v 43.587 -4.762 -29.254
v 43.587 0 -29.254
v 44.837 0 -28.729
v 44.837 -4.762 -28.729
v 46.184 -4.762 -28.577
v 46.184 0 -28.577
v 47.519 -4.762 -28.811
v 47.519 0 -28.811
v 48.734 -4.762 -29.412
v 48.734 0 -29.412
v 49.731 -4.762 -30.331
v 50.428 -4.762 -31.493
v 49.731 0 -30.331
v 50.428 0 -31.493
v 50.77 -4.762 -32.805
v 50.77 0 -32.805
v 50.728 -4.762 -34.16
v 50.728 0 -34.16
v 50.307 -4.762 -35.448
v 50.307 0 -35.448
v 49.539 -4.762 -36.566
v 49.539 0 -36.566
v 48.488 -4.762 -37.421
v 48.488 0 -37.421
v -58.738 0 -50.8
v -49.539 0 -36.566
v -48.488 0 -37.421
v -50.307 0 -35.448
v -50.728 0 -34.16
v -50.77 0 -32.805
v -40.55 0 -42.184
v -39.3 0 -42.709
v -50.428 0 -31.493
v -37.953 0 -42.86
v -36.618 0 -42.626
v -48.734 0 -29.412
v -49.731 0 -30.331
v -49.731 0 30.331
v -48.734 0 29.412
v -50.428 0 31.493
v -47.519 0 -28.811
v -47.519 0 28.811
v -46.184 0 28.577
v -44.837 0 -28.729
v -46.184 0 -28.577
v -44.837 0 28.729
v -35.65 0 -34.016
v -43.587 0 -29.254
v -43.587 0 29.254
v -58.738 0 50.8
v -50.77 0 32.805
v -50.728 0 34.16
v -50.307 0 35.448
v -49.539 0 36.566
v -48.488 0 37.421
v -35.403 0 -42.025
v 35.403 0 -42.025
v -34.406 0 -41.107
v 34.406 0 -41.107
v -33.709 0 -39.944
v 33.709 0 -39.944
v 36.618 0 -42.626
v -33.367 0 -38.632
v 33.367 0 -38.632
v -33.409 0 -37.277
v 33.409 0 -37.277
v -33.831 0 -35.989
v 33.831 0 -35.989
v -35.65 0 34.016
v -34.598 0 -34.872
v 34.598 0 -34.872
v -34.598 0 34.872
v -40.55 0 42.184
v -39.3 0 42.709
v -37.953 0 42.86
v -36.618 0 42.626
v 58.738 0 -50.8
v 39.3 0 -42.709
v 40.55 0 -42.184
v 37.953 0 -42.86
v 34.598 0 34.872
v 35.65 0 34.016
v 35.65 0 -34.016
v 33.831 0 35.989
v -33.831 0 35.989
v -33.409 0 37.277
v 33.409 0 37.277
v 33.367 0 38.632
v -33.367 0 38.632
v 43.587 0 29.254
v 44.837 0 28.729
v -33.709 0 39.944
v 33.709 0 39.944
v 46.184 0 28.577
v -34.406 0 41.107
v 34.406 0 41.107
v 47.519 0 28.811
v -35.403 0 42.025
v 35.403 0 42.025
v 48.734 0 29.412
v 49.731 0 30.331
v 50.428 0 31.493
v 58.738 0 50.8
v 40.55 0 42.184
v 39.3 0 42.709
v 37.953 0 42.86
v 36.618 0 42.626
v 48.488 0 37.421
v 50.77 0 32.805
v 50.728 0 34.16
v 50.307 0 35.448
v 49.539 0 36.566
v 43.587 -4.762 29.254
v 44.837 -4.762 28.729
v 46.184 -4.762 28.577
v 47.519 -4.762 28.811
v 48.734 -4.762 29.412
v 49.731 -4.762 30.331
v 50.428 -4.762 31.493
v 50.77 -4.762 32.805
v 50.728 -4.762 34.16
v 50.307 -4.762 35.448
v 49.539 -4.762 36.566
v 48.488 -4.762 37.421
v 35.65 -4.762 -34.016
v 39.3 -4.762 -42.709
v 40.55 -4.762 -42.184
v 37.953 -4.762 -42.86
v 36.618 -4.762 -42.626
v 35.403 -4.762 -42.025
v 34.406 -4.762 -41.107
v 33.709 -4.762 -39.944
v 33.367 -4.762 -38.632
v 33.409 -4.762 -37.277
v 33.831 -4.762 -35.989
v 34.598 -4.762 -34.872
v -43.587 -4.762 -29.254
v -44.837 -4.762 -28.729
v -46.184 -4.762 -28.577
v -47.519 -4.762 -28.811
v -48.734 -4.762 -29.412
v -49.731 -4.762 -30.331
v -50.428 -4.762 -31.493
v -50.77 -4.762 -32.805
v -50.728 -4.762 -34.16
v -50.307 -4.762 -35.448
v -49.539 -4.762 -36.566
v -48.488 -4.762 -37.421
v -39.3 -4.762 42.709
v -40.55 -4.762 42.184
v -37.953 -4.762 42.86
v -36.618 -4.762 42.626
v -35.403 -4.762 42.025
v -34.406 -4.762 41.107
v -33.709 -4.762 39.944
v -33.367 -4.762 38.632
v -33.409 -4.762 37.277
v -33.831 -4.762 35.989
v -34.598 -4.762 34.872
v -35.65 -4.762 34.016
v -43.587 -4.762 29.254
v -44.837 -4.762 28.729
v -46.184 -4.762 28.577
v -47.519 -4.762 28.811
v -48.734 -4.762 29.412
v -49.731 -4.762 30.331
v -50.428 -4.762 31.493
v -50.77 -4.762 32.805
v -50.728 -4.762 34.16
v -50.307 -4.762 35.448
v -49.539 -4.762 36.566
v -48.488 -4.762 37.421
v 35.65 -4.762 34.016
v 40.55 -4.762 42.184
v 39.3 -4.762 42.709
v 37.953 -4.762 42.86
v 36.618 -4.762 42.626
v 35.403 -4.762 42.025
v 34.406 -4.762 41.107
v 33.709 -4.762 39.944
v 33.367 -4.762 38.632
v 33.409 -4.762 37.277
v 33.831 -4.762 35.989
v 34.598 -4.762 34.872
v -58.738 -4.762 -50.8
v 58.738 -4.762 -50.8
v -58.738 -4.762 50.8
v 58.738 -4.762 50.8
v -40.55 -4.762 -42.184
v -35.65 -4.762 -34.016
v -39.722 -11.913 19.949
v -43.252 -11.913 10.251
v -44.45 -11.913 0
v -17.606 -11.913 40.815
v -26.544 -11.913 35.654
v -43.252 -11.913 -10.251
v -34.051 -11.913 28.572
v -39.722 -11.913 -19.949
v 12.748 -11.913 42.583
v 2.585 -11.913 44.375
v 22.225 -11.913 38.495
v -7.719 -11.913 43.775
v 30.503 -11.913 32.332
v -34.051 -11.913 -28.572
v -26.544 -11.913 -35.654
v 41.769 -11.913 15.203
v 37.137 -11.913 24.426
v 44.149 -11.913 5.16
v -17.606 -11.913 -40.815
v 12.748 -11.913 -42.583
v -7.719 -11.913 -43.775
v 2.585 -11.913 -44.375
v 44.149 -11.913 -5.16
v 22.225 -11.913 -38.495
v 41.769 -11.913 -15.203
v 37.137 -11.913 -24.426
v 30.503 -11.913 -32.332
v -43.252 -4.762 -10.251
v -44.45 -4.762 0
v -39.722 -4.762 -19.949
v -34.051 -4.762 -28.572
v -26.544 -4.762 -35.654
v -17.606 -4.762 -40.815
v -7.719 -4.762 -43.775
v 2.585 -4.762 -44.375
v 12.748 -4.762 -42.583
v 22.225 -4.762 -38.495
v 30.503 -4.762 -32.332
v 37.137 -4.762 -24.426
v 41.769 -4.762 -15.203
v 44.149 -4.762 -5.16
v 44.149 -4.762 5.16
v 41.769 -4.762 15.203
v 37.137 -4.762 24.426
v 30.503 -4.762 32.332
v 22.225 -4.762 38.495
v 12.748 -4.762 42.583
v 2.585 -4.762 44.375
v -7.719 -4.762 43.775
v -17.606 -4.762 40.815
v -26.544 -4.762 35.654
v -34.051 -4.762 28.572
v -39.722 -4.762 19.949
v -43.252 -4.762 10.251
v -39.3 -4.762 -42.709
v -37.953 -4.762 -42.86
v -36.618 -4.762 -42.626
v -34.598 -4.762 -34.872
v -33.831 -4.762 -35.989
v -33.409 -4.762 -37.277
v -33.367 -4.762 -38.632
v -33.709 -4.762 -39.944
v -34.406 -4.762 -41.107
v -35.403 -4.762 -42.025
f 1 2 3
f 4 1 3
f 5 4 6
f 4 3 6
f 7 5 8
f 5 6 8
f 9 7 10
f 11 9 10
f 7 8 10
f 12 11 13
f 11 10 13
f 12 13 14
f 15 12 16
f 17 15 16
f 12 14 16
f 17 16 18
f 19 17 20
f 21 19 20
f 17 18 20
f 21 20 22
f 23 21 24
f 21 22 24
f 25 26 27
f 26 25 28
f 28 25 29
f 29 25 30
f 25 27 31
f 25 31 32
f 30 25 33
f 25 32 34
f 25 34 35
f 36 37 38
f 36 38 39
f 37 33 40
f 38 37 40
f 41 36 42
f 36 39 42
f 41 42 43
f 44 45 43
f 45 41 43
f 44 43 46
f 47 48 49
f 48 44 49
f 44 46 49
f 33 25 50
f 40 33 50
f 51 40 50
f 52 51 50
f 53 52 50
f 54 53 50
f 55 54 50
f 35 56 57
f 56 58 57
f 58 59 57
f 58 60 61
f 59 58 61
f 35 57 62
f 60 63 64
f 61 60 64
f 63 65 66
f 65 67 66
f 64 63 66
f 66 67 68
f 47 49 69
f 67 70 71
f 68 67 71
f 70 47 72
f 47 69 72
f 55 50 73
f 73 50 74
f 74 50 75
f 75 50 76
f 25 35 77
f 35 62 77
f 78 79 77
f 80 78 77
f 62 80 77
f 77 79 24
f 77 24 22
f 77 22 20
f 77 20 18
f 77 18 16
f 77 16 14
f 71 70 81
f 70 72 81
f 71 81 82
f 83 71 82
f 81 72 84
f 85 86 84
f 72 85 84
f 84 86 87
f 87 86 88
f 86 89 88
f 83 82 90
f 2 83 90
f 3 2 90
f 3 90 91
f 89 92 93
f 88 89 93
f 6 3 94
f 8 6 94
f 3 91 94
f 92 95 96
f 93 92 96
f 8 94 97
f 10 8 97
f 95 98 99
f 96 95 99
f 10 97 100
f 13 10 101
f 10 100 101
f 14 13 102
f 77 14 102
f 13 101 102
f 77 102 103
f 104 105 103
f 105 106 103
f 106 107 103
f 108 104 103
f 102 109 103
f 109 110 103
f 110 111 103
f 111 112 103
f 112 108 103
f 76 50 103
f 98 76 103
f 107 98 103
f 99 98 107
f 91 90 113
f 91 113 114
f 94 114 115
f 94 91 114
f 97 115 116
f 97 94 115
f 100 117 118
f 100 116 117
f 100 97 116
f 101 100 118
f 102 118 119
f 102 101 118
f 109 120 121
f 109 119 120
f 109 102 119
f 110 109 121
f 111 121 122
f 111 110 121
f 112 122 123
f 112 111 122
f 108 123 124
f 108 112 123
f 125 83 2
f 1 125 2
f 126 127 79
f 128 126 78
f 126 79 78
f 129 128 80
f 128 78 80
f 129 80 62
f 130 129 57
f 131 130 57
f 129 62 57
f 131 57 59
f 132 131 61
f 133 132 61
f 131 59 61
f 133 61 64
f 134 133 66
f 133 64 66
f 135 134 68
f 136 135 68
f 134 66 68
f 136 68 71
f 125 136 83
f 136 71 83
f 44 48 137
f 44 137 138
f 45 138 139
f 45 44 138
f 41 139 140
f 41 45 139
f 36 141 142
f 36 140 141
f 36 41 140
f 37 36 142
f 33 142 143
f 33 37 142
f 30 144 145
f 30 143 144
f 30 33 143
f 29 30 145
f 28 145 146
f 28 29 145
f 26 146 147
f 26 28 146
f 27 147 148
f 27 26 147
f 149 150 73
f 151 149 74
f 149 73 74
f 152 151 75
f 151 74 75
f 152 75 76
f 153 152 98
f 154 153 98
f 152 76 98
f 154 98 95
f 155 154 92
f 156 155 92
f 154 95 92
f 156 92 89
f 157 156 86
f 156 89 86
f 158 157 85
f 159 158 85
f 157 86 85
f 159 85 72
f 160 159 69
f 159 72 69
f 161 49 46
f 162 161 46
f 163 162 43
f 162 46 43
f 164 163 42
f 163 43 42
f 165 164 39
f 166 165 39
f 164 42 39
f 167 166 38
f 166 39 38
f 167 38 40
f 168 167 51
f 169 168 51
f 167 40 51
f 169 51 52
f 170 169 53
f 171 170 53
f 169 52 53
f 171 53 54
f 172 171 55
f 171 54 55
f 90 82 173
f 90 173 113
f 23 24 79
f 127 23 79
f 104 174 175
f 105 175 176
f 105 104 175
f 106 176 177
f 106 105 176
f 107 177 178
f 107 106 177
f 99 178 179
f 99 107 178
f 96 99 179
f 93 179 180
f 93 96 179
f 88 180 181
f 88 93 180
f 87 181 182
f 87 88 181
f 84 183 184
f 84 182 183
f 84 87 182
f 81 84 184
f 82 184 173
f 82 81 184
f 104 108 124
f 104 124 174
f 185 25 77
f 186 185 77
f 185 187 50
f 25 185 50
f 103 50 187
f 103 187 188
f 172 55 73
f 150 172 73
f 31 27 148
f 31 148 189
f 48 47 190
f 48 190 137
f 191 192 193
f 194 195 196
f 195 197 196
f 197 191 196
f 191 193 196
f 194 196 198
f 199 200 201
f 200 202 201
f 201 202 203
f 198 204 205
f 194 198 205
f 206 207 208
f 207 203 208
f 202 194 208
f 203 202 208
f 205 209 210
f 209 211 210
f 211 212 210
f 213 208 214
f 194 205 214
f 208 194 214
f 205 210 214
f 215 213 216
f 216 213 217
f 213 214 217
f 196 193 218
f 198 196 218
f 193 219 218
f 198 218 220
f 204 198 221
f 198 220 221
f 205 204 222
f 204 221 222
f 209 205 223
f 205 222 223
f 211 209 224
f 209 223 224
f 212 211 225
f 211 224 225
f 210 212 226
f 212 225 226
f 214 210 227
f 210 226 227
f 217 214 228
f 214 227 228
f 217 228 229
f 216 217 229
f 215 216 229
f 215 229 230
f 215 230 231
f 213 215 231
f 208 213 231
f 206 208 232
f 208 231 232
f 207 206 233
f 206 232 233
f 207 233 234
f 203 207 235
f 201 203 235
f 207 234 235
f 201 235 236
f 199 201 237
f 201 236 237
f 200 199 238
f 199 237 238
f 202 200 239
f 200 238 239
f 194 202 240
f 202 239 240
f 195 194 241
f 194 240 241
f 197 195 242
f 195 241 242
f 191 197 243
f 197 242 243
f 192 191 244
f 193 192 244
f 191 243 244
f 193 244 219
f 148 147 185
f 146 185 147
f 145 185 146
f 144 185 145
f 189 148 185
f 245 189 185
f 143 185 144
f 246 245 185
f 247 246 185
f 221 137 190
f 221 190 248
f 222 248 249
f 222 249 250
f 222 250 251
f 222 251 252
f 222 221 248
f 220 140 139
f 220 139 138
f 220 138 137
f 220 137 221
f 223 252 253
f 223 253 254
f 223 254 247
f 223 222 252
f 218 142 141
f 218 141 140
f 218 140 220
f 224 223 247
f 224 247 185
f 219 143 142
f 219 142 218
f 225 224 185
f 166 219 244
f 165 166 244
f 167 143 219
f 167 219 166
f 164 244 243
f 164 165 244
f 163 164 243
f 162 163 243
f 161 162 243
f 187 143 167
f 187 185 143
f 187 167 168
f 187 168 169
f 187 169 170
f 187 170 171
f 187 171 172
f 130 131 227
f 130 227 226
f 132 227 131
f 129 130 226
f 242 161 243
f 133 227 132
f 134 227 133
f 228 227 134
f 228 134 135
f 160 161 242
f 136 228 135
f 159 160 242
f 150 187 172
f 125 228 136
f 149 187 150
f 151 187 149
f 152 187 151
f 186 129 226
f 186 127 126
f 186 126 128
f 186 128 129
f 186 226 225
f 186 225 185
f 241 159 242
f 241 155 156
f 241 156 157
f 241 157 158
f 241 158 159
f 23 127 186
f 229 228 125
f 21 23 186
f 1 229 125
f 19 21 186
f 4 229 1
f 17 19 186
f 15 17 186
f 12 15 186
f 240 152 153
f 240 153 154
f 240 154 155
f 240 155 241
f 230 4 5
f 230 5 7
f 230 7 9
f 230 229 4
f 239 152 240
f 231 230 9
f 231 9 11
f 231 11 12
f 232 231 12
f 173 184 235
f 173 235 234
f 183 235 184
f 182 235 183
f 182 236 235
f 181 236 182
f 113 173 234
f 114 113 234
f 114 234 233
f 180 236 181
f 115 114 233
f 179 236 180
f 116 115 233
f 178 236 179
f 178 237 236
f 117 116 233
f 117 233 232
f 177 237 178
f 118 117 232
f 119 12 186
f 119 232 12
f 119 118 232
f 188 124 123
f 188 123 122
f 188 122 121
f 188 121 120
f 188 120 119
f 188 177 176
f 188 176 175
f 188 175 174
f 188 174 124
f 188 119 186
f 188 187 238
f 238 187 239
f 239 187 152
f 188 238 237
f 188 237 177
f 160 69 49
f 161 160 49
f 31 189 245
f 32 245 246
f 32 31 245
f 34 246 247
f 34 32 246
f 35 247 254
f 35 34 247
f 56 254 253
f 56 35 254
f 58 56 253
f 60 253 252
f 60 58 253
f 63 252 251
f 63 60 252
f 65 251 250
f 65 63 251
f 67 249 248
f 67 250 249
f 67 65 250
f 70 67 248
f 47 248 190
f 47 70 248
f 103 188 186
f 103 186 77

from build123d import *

# Parameters (mm, degrees)
SKETCH1_W               = 117.475
SKETCH1_H               = 4.7625
BOSS_EXTRUDE1_DEPTH     = 50.8
F_1_2_HOLES_DEPTH       = 78.803697293
SKETCH7_W               = 170.933784369
SKETCH7_H               = 70.3072
BOSS_EXTRUDE2_DEPTH     = 164.9349
CUT_EXTRUDE1_DEPTH      = 252.384886958
CUT_EXTRUDE1_DEPTH_BACK = 252.384886958
CUT_EXTRUDE3_DEPTH      = 208.174206511
CUT_EXTRUDE3_DEPTH_BACK = 208.174206511
SKETCH9_OUTSIDE_W       = 162.248
SKETCH9_OUTSIDE_H       = 251.148
BOSS_EXTRUDE3_DEPTH     = 7.9375
SKETCH11_OUTSIDE_W      = 1143.154
SKETCH11_OUTSIDE_H      = 1135.216
SKETCH11_OUTSIDE_R      = 11.1125
CUT_EXTRUDE4_DEPTH      = 255.208337191
CUT_EXTRUDE4_DRAFT      = -60
SKETCH12_R              = 10.795
BOSS_EXTRUDE4_DEPTH     = 64.77
SKETCH13_R              = 298.45
CUT_EXTRUDE5_DEPTH      = 254


with BuildPart() as part:
    # Sketch1 → Boss-Extrude1 (new, symmetric)
    with BuildSketch(Plane.XY):
        with Locations((0, -2.38125)):
            Rectangle(SKETCH1_W, SKETCH1_H)
    extrude(amount=BOSS_EXTRUDE1_DEPTH, both=True)

    # Sketch2 → 1-2 holes (cut, through all)
    with BuildSketch(Plane(origin=(0, 0, 0), x_dir=(1, 0, 0), z_dir=(0, 1, 0))):
        with BuildLine():
            Line((-35.649713965, 34.016189941), (-43.587213965, 29.253689941))
            ThreePointArc((-43.587213965, 29.253689941), (-50.121310059, 30.887213965), (-48.487786035, 37.421310059))
            Line((-48.487786035, 37.421310059), (-40.550286035, 42.183810059))
            ThreePointArc((-40.550286035, 42.183810059), (-34.016189941, 40.550286035), (-35.649713965, 34.016189941))
        make_face()
        with BuildLine():
            Line((-35.649713965, -34.016189941), (-43.587213965, -29.253689941))
            ThreePointArc((-43.587213965, -29.253689941), (-50.121310059, -30.887213965), (-48.487786035, -37.421310059))
            Line((-48.487786035, -37.421310059), (-40.550286035, -42.183810059))
            ThreePointArc((-40.550286035, -42.183810059), (-34.016189941, -40.550286035), (-35.649713965, -34.016189941))
        make_face()
        with BuildLine():
            Line((35.649713965, 34.016189941), (43.587213965, 29.253689941))
            ThreePointArc((43.587213965, 29.253689941), (50.121310059, 30.887213965), (48.487786035, 37.421310059))
            Line((48.487786035, 37.421310059), (40.550286035, 42.183810059))
            ThreePointArc((40.550286035, 42.183810059), (34.016189941, 40.550286035), (35.649713965, 34.016189941))
        make_face()
        with BuildLine():
            Line((35.649713965, -34.016189941), (43.587213965, -29.253689941))
            ThreePointArc((43.587213965, -29.253689941), (50.121310059, -30.887213965), (48.487786035, -37.421310059))
            Line((48.487786035, -37.421310059), (40.550286035, -42.183810059))
            ThreePointArc((40.550286035, -42.183810059), (34.016189941, -40.550286035), (35.649713965, -34.016189941))
        make_face()
    extrude(amount=-F_1_2_HOLES_DEPTH, mode=Mode.SUBTRACT)


with BuildPart() as body_2:
    # Sketch4 → Revolve1 (revolve)
    with BuildSketch(Plane.XY, mode=Mode.PRIVATE) as revolve1_sk:
        Polygon((0, -25.5651), (43.18, -25.5651), (43.18, -14.4526), (40.64, -14.4526), (40.64, -11.9126), (44.45, -11.9126), (44.45, -4.7625), (0, -4.7625), align=None)
    revolve(revolve1_sk.sketch.rotate(Axis((0, -4.7625, 0), (0, -1, 0)), 180), axis=Axis((0, -4.7625, 0), (0, -1, 0)))


with BuildPart() as body_3:
    # Sketch6 → Revolve2 (revolve)
    with BuildSketch(Plane(origin=(-63.5, 0, 0), x_dir=(0, 0, -1), z_dir=(1, 0, 0)), mode=Mode.PRIVATE) as revolve2_sk:
        with BuildLine():
            Line((-25.4, -68.58), (-25.4, -47.336363636))
            ThreePointArc((-25.4, -47.336363636), (-22.694731724, -40.805268276), (-16.163636364, -38.1))
            Line((-16.163636364, -38.1), (-14.143181818, -38.1))
            Line((-14.143181818, -38.1), (-14.143181818, -40.48125))
            Line((-14.143181818, -40.48125), (-10.102272727, -40.48125))
            Line((-10.102272727, -40.48125), (-10.102272727, -38.1))
            Line((-10.102272727, -38.1), (-6.061363636, -38.1))
            Line((-6.061363636, -38.1), (-6.061363636, -40.48125))
            Line((-6.061363636, -40.48125), (-2.020454545, -40.48125))
            Line((-2.020454545, -40.48125), (-2.020454545, -38.1))
            Line((-2.020454545, -38.1), (2.020454545, -38.1))
            Line((2.020454545, -38.1), (2.020454545, -40.48125))
            Line((2.020454545, -40.48125), (6.061363636, -40.48125))
            Line((6.061363636, -40.48125), (6.061363636, -38.1))
            Line((6.061363636, -38.1), (10.102272727, -38.1))
            Line((10.102272727, -38.1), (10.102272727, -40.48125))
            Line((10.102272727, -40.48125), (14.143181818, -40.48125))
            Line((14.143181818, -40.48125), (14.143181818, -38.1))
            Line((14.143181818, -38.1), (16.163636364, -38.1))
            ThreePointArc((16.163636364, -38.1), (22.694731724, -40.805268276), (25.4, -47.336363636))
            Line((25.4, -47.336363636), (25.4, -68.58))
            Line((25.4, -68.58), (26.67, -68.58))
            Line((26.67, -68.58), (26.67, -71.12))
            Line((26.67, -71.12), (23.495, -71.12))
            ThreePointArc((23.495, -71.12), (19.004871939, -72.979871939), (17.145, -77.47))
            ThreePointArc((17.145, -77.47), (15.476711089, -81.759997818), (11.348438966, -83.795836333))
            Line((11.348438966, -83.795836333), (5.438280517, -84.312908197))
            ThreePointArc((5.438280517, -84.312908197), (3.374144456, -85.330827454), (2.54, -87.475826363))
            Line((2.54, -87.475826363), (2.54, -93.6625))
            Line((2.54, -93.6625), (26.67, -93.6625))
            Line((26.67, -93.6625), (29.845, -93.6625))
            Line((29.845, -93.6625), (29.845, -114.3))
            Line((29.845, -114.3), (-29.845, -114.3))
            Line((-29.845, -114.3), (-29.845, -93.6625))
            Line((-29.845, -93.6625), (-26.67, -93.6625))
            Line((-26.67, -93.6625), (-2.54, -93.6625))
            Line((-2.54, -93.6625), (-2.54, -87.475826363))
            ThreePointArc((-2.54, -87.475826363), (-3.374144456, -85.330827454), (-5.438280517, -84.312908197))
            Line((-5.438280517, -84.312908197), (-11.348438966, -83.795836333))
            ThreePointArc((-11.348438966, -83.795836333), (-15.476711089, -81.759997818), (-17.145, -77.47))
            ThreePointArc((-17.145, -77.47), (-19.004871939, -72.979871939), (-23.495, -71.12))
            Line((-23.495, -71.12), (-26.67, -71.12))
            Line((-26.67, -71.12), (-26.67, -68.58))
            Line((-26.67, -68.58), (-25.4, -68.58))
        make_face()
    revolve(revolve2_sk.sketch.rotate(Axis((-63.5, -114.3, 111.145303652), (0, 0, -1)), 90), axis=Axis((-63.5, -114.3, 111.145303652), (0, 0, -1)))


with BuildPart() as body_4:
    # Sketch7 → Boss-Extrude2 (new body)
    with BuildSketch(Plane.XZ.offset(25.5651)):
        with Locations((-54.233107816, 0)):
            Rectangle(SKETCH7_W, SKETCH7_H)
    extrude(amount=BOSS_EXTRUDE2_DEPTH)

    # Sketch8 → Cut-Extrude1 (cut, two sides: drawn at the far end of the back side and taken through both)
    with BuildSketch(Plane.XY.offset(35.1536).offset(-CUT_EXTRUDE1_DEPTH_BACK)):
        with BuildLine():
            Line((313.51958325, 368.901075357), (31.233784369, -25.5651))
            Line((31.233784369, -25.5651), (-42.844161681, -129.081621811))
            ThreePointArc((-42.844161681, -129.081621811), (-78.281621811, -134.955838319), (-84.155838319, -99.518378189))
            Line((-84.155838319, -99.518378189), (-31.233784369, -25.5651))
            Line((-31.233784369, -25.5651), (251.052014512, 368.901075357))
            Line((251.052014512, 368.901075357), (251.052014512, -601.230535819))
            Line((251.052014512, -601.230535819), (313.51958325, -601.230535819))
            Line((313.51958325, -601.230535819), (313.51958325, 368.901075357))
        make_face()
    extrude(amount=CUT_EXTRUDE1_DEPTH + CUT_EXTRUDE1_DEPTH_BACK, mode=Mode.SUBTRACT)

    # Sketch9 outside → Cut-Extrude3 (cut, two sides: drawn at the far end of the back side and taken through both)
    with BuildSketch(Plane(origin=(0, -144.306693689, 0), x_dir=(0, 0, -1), z_dir=(-1, 0, 0)).offset(-CUT_EXTRUDE3_DEPTH_BACK)):
        with Locations((0, -49.057)):
            Rectangle(SKETCH9_OUTSIDE_W, SKETCH9_OUTSIDE_H)
        Polygon((35.1536, 46.193306311), (35.1536, -106.206693689), (29.815484467, -118.741593689), (27.046884467, -118.741593689), (32.385, -106.206693689), (32.385, 46.193306311), align=None, mode=Mode.SUBTRACT)
        Polygon((-27.046884467, -118.741593689), (-29.815484467, -118.741593689), (-35.1536, -106.206693689), (-35.1536, 46.193306311), (-32.385, 46.193306311), (-32.385, -106.206693689), align=None, mode=Mode.SUBTRACT)
    extrude(amount=CUT_EXTRUDE3_DEPTH + CUT_EXTRUDE3_DEPTH_BACK, mode=Mode.SUBTRACT)


with BuildPart() as cut_extrude3_piece_1:
    # of the separate pieces the step leaves, piece 1, a body of its own (cut_extrude3_pieces)
    add(body_4.part.solids().sort_by_distance((31.233784369, -25.5651, -29.815484467))[0])



with BuildPart() as cut_extrude3_piece_2:
    # of the separate pieces the step leaves, piece 2, a body of its own (cut_extrude3_pieces)
    add(body_4.part.solids().sort_by_distance((22.263625502, -38.1, 35.1536))[0])


with BuildPart() as body_6:
    # Sketch10 → Boss-Extrude3 (new body)
    with BuildSketch(Plane.XY.offset(35.1536)):
        Polygon((-63.5, -101.468390267), (-74.6125, -107.884195134), (-74.6125, -120.715804866), (-63.5, -127.131609733), (-52.3875, -120.715804866), (-52.3875, -107.884195134), align=None)
    extrude(amount=BOSS_EXTRUDE3_DEPTH)


with BuildPart() as cut_extrude4_tool:
    # Sketch11 outside → Cut-Extrude4 (with draft: the straight prism first)
    with BuildSketch(Plane.XY.offset(43.0911)):
        with Locations((-40.481, -95.25)):
            Rectangle(SKETCH11_OUTSIDE_W, SKETCH11_OUTSIDE_H)
        with Locations((-63.5, -114.3)):
            Circle(SKETCH11_OUTSIDE_R, mode=Mode.SUBTRACT)
    extrude(amount=-CUT_EXTRUDE4_DEPTH)
    # Cut-Extrude4: the draft: its side faces are tilted about the plane it starts from
    cut_extrude4_sides = [cut_extrude4_tool.faces().sort_by_distance(p)[0] for p in [
        (-40.481, -662.858, -84.513068595),
        (531.096, -95.25, -84.513068595),
        (-40.481, 472.358, -84.513068595),
        (-612.058, -95.25, -84.513068595),
        (-74.6125, -114.3, -84.513068595),
    ]]
    draft(cut_extrude4_sides, Plane.XY.offset(43.0911), CUT_EXTRUDE4_DRAFT)


with BuildPart() as body_6_1:
    add(body_6.part)

    # Cut-Extrude4: cut by cut_extrude4_tool
    add(cut_extrude4_tool.part, mode=Mode.SUBTRACT)


with BuildPart() as body_7:
    # Mirror1: mirrored copy
    add(body_6_1.part.mirror(Plane.XY))


with BuildPart() as cut_extrude3_piece_1_1:
    add(cut_extrude3_piece_1.part)

    add(cut_extrude3_piece_2.part)  # Boss-Extrude4 merges Cut-Extrude3 piece 2
    # Sketch12 → Boss-Extrude4 (add)
    with BuildSketch(Plane.XY.offset(-32.385)):
        with Locations(Location((-63.5, -114.3, 0), (0, 0, 180))):
            Circle(SKETCH12_R)
    extrude(amount=BOSS_EXTRUDE4_DEPTH)

    # Combine1: union body 7, body 6, body 2, part
    add(body_7.part)
    add(body_6_1.part)
    add(body_2.part)
    add(part.part)


with BuildPart() as cut_extrude5_tool:
    # Sketch13 → Cut-Extrude5 (new body)
    with BuildSketch(Plane.XZ.offset(11.9126)):
        Circle(SKETCH13_R)
    extrude(amount=CUT_EXTRUDE5_DEPTH)


with BuildPart() as body_3_1:
    add(body_3.part)

    # Cut-Extrude5: cut by cut_extrude5_tool
    add(cut_extrude5_tool.part, mode=Mode.SUBTRACT)


with BuildPart() as cut_extrude3_piece_1_2:
    add(cut_extrude3_piece_1_1.part)

    # Cut-Extrude5: cut by cut_extrude5_tool
    add(cut_extrude5_tool.part, mode=Mode.SUBTRACT)


solid = cut_extrude3_piece_1_2.part
